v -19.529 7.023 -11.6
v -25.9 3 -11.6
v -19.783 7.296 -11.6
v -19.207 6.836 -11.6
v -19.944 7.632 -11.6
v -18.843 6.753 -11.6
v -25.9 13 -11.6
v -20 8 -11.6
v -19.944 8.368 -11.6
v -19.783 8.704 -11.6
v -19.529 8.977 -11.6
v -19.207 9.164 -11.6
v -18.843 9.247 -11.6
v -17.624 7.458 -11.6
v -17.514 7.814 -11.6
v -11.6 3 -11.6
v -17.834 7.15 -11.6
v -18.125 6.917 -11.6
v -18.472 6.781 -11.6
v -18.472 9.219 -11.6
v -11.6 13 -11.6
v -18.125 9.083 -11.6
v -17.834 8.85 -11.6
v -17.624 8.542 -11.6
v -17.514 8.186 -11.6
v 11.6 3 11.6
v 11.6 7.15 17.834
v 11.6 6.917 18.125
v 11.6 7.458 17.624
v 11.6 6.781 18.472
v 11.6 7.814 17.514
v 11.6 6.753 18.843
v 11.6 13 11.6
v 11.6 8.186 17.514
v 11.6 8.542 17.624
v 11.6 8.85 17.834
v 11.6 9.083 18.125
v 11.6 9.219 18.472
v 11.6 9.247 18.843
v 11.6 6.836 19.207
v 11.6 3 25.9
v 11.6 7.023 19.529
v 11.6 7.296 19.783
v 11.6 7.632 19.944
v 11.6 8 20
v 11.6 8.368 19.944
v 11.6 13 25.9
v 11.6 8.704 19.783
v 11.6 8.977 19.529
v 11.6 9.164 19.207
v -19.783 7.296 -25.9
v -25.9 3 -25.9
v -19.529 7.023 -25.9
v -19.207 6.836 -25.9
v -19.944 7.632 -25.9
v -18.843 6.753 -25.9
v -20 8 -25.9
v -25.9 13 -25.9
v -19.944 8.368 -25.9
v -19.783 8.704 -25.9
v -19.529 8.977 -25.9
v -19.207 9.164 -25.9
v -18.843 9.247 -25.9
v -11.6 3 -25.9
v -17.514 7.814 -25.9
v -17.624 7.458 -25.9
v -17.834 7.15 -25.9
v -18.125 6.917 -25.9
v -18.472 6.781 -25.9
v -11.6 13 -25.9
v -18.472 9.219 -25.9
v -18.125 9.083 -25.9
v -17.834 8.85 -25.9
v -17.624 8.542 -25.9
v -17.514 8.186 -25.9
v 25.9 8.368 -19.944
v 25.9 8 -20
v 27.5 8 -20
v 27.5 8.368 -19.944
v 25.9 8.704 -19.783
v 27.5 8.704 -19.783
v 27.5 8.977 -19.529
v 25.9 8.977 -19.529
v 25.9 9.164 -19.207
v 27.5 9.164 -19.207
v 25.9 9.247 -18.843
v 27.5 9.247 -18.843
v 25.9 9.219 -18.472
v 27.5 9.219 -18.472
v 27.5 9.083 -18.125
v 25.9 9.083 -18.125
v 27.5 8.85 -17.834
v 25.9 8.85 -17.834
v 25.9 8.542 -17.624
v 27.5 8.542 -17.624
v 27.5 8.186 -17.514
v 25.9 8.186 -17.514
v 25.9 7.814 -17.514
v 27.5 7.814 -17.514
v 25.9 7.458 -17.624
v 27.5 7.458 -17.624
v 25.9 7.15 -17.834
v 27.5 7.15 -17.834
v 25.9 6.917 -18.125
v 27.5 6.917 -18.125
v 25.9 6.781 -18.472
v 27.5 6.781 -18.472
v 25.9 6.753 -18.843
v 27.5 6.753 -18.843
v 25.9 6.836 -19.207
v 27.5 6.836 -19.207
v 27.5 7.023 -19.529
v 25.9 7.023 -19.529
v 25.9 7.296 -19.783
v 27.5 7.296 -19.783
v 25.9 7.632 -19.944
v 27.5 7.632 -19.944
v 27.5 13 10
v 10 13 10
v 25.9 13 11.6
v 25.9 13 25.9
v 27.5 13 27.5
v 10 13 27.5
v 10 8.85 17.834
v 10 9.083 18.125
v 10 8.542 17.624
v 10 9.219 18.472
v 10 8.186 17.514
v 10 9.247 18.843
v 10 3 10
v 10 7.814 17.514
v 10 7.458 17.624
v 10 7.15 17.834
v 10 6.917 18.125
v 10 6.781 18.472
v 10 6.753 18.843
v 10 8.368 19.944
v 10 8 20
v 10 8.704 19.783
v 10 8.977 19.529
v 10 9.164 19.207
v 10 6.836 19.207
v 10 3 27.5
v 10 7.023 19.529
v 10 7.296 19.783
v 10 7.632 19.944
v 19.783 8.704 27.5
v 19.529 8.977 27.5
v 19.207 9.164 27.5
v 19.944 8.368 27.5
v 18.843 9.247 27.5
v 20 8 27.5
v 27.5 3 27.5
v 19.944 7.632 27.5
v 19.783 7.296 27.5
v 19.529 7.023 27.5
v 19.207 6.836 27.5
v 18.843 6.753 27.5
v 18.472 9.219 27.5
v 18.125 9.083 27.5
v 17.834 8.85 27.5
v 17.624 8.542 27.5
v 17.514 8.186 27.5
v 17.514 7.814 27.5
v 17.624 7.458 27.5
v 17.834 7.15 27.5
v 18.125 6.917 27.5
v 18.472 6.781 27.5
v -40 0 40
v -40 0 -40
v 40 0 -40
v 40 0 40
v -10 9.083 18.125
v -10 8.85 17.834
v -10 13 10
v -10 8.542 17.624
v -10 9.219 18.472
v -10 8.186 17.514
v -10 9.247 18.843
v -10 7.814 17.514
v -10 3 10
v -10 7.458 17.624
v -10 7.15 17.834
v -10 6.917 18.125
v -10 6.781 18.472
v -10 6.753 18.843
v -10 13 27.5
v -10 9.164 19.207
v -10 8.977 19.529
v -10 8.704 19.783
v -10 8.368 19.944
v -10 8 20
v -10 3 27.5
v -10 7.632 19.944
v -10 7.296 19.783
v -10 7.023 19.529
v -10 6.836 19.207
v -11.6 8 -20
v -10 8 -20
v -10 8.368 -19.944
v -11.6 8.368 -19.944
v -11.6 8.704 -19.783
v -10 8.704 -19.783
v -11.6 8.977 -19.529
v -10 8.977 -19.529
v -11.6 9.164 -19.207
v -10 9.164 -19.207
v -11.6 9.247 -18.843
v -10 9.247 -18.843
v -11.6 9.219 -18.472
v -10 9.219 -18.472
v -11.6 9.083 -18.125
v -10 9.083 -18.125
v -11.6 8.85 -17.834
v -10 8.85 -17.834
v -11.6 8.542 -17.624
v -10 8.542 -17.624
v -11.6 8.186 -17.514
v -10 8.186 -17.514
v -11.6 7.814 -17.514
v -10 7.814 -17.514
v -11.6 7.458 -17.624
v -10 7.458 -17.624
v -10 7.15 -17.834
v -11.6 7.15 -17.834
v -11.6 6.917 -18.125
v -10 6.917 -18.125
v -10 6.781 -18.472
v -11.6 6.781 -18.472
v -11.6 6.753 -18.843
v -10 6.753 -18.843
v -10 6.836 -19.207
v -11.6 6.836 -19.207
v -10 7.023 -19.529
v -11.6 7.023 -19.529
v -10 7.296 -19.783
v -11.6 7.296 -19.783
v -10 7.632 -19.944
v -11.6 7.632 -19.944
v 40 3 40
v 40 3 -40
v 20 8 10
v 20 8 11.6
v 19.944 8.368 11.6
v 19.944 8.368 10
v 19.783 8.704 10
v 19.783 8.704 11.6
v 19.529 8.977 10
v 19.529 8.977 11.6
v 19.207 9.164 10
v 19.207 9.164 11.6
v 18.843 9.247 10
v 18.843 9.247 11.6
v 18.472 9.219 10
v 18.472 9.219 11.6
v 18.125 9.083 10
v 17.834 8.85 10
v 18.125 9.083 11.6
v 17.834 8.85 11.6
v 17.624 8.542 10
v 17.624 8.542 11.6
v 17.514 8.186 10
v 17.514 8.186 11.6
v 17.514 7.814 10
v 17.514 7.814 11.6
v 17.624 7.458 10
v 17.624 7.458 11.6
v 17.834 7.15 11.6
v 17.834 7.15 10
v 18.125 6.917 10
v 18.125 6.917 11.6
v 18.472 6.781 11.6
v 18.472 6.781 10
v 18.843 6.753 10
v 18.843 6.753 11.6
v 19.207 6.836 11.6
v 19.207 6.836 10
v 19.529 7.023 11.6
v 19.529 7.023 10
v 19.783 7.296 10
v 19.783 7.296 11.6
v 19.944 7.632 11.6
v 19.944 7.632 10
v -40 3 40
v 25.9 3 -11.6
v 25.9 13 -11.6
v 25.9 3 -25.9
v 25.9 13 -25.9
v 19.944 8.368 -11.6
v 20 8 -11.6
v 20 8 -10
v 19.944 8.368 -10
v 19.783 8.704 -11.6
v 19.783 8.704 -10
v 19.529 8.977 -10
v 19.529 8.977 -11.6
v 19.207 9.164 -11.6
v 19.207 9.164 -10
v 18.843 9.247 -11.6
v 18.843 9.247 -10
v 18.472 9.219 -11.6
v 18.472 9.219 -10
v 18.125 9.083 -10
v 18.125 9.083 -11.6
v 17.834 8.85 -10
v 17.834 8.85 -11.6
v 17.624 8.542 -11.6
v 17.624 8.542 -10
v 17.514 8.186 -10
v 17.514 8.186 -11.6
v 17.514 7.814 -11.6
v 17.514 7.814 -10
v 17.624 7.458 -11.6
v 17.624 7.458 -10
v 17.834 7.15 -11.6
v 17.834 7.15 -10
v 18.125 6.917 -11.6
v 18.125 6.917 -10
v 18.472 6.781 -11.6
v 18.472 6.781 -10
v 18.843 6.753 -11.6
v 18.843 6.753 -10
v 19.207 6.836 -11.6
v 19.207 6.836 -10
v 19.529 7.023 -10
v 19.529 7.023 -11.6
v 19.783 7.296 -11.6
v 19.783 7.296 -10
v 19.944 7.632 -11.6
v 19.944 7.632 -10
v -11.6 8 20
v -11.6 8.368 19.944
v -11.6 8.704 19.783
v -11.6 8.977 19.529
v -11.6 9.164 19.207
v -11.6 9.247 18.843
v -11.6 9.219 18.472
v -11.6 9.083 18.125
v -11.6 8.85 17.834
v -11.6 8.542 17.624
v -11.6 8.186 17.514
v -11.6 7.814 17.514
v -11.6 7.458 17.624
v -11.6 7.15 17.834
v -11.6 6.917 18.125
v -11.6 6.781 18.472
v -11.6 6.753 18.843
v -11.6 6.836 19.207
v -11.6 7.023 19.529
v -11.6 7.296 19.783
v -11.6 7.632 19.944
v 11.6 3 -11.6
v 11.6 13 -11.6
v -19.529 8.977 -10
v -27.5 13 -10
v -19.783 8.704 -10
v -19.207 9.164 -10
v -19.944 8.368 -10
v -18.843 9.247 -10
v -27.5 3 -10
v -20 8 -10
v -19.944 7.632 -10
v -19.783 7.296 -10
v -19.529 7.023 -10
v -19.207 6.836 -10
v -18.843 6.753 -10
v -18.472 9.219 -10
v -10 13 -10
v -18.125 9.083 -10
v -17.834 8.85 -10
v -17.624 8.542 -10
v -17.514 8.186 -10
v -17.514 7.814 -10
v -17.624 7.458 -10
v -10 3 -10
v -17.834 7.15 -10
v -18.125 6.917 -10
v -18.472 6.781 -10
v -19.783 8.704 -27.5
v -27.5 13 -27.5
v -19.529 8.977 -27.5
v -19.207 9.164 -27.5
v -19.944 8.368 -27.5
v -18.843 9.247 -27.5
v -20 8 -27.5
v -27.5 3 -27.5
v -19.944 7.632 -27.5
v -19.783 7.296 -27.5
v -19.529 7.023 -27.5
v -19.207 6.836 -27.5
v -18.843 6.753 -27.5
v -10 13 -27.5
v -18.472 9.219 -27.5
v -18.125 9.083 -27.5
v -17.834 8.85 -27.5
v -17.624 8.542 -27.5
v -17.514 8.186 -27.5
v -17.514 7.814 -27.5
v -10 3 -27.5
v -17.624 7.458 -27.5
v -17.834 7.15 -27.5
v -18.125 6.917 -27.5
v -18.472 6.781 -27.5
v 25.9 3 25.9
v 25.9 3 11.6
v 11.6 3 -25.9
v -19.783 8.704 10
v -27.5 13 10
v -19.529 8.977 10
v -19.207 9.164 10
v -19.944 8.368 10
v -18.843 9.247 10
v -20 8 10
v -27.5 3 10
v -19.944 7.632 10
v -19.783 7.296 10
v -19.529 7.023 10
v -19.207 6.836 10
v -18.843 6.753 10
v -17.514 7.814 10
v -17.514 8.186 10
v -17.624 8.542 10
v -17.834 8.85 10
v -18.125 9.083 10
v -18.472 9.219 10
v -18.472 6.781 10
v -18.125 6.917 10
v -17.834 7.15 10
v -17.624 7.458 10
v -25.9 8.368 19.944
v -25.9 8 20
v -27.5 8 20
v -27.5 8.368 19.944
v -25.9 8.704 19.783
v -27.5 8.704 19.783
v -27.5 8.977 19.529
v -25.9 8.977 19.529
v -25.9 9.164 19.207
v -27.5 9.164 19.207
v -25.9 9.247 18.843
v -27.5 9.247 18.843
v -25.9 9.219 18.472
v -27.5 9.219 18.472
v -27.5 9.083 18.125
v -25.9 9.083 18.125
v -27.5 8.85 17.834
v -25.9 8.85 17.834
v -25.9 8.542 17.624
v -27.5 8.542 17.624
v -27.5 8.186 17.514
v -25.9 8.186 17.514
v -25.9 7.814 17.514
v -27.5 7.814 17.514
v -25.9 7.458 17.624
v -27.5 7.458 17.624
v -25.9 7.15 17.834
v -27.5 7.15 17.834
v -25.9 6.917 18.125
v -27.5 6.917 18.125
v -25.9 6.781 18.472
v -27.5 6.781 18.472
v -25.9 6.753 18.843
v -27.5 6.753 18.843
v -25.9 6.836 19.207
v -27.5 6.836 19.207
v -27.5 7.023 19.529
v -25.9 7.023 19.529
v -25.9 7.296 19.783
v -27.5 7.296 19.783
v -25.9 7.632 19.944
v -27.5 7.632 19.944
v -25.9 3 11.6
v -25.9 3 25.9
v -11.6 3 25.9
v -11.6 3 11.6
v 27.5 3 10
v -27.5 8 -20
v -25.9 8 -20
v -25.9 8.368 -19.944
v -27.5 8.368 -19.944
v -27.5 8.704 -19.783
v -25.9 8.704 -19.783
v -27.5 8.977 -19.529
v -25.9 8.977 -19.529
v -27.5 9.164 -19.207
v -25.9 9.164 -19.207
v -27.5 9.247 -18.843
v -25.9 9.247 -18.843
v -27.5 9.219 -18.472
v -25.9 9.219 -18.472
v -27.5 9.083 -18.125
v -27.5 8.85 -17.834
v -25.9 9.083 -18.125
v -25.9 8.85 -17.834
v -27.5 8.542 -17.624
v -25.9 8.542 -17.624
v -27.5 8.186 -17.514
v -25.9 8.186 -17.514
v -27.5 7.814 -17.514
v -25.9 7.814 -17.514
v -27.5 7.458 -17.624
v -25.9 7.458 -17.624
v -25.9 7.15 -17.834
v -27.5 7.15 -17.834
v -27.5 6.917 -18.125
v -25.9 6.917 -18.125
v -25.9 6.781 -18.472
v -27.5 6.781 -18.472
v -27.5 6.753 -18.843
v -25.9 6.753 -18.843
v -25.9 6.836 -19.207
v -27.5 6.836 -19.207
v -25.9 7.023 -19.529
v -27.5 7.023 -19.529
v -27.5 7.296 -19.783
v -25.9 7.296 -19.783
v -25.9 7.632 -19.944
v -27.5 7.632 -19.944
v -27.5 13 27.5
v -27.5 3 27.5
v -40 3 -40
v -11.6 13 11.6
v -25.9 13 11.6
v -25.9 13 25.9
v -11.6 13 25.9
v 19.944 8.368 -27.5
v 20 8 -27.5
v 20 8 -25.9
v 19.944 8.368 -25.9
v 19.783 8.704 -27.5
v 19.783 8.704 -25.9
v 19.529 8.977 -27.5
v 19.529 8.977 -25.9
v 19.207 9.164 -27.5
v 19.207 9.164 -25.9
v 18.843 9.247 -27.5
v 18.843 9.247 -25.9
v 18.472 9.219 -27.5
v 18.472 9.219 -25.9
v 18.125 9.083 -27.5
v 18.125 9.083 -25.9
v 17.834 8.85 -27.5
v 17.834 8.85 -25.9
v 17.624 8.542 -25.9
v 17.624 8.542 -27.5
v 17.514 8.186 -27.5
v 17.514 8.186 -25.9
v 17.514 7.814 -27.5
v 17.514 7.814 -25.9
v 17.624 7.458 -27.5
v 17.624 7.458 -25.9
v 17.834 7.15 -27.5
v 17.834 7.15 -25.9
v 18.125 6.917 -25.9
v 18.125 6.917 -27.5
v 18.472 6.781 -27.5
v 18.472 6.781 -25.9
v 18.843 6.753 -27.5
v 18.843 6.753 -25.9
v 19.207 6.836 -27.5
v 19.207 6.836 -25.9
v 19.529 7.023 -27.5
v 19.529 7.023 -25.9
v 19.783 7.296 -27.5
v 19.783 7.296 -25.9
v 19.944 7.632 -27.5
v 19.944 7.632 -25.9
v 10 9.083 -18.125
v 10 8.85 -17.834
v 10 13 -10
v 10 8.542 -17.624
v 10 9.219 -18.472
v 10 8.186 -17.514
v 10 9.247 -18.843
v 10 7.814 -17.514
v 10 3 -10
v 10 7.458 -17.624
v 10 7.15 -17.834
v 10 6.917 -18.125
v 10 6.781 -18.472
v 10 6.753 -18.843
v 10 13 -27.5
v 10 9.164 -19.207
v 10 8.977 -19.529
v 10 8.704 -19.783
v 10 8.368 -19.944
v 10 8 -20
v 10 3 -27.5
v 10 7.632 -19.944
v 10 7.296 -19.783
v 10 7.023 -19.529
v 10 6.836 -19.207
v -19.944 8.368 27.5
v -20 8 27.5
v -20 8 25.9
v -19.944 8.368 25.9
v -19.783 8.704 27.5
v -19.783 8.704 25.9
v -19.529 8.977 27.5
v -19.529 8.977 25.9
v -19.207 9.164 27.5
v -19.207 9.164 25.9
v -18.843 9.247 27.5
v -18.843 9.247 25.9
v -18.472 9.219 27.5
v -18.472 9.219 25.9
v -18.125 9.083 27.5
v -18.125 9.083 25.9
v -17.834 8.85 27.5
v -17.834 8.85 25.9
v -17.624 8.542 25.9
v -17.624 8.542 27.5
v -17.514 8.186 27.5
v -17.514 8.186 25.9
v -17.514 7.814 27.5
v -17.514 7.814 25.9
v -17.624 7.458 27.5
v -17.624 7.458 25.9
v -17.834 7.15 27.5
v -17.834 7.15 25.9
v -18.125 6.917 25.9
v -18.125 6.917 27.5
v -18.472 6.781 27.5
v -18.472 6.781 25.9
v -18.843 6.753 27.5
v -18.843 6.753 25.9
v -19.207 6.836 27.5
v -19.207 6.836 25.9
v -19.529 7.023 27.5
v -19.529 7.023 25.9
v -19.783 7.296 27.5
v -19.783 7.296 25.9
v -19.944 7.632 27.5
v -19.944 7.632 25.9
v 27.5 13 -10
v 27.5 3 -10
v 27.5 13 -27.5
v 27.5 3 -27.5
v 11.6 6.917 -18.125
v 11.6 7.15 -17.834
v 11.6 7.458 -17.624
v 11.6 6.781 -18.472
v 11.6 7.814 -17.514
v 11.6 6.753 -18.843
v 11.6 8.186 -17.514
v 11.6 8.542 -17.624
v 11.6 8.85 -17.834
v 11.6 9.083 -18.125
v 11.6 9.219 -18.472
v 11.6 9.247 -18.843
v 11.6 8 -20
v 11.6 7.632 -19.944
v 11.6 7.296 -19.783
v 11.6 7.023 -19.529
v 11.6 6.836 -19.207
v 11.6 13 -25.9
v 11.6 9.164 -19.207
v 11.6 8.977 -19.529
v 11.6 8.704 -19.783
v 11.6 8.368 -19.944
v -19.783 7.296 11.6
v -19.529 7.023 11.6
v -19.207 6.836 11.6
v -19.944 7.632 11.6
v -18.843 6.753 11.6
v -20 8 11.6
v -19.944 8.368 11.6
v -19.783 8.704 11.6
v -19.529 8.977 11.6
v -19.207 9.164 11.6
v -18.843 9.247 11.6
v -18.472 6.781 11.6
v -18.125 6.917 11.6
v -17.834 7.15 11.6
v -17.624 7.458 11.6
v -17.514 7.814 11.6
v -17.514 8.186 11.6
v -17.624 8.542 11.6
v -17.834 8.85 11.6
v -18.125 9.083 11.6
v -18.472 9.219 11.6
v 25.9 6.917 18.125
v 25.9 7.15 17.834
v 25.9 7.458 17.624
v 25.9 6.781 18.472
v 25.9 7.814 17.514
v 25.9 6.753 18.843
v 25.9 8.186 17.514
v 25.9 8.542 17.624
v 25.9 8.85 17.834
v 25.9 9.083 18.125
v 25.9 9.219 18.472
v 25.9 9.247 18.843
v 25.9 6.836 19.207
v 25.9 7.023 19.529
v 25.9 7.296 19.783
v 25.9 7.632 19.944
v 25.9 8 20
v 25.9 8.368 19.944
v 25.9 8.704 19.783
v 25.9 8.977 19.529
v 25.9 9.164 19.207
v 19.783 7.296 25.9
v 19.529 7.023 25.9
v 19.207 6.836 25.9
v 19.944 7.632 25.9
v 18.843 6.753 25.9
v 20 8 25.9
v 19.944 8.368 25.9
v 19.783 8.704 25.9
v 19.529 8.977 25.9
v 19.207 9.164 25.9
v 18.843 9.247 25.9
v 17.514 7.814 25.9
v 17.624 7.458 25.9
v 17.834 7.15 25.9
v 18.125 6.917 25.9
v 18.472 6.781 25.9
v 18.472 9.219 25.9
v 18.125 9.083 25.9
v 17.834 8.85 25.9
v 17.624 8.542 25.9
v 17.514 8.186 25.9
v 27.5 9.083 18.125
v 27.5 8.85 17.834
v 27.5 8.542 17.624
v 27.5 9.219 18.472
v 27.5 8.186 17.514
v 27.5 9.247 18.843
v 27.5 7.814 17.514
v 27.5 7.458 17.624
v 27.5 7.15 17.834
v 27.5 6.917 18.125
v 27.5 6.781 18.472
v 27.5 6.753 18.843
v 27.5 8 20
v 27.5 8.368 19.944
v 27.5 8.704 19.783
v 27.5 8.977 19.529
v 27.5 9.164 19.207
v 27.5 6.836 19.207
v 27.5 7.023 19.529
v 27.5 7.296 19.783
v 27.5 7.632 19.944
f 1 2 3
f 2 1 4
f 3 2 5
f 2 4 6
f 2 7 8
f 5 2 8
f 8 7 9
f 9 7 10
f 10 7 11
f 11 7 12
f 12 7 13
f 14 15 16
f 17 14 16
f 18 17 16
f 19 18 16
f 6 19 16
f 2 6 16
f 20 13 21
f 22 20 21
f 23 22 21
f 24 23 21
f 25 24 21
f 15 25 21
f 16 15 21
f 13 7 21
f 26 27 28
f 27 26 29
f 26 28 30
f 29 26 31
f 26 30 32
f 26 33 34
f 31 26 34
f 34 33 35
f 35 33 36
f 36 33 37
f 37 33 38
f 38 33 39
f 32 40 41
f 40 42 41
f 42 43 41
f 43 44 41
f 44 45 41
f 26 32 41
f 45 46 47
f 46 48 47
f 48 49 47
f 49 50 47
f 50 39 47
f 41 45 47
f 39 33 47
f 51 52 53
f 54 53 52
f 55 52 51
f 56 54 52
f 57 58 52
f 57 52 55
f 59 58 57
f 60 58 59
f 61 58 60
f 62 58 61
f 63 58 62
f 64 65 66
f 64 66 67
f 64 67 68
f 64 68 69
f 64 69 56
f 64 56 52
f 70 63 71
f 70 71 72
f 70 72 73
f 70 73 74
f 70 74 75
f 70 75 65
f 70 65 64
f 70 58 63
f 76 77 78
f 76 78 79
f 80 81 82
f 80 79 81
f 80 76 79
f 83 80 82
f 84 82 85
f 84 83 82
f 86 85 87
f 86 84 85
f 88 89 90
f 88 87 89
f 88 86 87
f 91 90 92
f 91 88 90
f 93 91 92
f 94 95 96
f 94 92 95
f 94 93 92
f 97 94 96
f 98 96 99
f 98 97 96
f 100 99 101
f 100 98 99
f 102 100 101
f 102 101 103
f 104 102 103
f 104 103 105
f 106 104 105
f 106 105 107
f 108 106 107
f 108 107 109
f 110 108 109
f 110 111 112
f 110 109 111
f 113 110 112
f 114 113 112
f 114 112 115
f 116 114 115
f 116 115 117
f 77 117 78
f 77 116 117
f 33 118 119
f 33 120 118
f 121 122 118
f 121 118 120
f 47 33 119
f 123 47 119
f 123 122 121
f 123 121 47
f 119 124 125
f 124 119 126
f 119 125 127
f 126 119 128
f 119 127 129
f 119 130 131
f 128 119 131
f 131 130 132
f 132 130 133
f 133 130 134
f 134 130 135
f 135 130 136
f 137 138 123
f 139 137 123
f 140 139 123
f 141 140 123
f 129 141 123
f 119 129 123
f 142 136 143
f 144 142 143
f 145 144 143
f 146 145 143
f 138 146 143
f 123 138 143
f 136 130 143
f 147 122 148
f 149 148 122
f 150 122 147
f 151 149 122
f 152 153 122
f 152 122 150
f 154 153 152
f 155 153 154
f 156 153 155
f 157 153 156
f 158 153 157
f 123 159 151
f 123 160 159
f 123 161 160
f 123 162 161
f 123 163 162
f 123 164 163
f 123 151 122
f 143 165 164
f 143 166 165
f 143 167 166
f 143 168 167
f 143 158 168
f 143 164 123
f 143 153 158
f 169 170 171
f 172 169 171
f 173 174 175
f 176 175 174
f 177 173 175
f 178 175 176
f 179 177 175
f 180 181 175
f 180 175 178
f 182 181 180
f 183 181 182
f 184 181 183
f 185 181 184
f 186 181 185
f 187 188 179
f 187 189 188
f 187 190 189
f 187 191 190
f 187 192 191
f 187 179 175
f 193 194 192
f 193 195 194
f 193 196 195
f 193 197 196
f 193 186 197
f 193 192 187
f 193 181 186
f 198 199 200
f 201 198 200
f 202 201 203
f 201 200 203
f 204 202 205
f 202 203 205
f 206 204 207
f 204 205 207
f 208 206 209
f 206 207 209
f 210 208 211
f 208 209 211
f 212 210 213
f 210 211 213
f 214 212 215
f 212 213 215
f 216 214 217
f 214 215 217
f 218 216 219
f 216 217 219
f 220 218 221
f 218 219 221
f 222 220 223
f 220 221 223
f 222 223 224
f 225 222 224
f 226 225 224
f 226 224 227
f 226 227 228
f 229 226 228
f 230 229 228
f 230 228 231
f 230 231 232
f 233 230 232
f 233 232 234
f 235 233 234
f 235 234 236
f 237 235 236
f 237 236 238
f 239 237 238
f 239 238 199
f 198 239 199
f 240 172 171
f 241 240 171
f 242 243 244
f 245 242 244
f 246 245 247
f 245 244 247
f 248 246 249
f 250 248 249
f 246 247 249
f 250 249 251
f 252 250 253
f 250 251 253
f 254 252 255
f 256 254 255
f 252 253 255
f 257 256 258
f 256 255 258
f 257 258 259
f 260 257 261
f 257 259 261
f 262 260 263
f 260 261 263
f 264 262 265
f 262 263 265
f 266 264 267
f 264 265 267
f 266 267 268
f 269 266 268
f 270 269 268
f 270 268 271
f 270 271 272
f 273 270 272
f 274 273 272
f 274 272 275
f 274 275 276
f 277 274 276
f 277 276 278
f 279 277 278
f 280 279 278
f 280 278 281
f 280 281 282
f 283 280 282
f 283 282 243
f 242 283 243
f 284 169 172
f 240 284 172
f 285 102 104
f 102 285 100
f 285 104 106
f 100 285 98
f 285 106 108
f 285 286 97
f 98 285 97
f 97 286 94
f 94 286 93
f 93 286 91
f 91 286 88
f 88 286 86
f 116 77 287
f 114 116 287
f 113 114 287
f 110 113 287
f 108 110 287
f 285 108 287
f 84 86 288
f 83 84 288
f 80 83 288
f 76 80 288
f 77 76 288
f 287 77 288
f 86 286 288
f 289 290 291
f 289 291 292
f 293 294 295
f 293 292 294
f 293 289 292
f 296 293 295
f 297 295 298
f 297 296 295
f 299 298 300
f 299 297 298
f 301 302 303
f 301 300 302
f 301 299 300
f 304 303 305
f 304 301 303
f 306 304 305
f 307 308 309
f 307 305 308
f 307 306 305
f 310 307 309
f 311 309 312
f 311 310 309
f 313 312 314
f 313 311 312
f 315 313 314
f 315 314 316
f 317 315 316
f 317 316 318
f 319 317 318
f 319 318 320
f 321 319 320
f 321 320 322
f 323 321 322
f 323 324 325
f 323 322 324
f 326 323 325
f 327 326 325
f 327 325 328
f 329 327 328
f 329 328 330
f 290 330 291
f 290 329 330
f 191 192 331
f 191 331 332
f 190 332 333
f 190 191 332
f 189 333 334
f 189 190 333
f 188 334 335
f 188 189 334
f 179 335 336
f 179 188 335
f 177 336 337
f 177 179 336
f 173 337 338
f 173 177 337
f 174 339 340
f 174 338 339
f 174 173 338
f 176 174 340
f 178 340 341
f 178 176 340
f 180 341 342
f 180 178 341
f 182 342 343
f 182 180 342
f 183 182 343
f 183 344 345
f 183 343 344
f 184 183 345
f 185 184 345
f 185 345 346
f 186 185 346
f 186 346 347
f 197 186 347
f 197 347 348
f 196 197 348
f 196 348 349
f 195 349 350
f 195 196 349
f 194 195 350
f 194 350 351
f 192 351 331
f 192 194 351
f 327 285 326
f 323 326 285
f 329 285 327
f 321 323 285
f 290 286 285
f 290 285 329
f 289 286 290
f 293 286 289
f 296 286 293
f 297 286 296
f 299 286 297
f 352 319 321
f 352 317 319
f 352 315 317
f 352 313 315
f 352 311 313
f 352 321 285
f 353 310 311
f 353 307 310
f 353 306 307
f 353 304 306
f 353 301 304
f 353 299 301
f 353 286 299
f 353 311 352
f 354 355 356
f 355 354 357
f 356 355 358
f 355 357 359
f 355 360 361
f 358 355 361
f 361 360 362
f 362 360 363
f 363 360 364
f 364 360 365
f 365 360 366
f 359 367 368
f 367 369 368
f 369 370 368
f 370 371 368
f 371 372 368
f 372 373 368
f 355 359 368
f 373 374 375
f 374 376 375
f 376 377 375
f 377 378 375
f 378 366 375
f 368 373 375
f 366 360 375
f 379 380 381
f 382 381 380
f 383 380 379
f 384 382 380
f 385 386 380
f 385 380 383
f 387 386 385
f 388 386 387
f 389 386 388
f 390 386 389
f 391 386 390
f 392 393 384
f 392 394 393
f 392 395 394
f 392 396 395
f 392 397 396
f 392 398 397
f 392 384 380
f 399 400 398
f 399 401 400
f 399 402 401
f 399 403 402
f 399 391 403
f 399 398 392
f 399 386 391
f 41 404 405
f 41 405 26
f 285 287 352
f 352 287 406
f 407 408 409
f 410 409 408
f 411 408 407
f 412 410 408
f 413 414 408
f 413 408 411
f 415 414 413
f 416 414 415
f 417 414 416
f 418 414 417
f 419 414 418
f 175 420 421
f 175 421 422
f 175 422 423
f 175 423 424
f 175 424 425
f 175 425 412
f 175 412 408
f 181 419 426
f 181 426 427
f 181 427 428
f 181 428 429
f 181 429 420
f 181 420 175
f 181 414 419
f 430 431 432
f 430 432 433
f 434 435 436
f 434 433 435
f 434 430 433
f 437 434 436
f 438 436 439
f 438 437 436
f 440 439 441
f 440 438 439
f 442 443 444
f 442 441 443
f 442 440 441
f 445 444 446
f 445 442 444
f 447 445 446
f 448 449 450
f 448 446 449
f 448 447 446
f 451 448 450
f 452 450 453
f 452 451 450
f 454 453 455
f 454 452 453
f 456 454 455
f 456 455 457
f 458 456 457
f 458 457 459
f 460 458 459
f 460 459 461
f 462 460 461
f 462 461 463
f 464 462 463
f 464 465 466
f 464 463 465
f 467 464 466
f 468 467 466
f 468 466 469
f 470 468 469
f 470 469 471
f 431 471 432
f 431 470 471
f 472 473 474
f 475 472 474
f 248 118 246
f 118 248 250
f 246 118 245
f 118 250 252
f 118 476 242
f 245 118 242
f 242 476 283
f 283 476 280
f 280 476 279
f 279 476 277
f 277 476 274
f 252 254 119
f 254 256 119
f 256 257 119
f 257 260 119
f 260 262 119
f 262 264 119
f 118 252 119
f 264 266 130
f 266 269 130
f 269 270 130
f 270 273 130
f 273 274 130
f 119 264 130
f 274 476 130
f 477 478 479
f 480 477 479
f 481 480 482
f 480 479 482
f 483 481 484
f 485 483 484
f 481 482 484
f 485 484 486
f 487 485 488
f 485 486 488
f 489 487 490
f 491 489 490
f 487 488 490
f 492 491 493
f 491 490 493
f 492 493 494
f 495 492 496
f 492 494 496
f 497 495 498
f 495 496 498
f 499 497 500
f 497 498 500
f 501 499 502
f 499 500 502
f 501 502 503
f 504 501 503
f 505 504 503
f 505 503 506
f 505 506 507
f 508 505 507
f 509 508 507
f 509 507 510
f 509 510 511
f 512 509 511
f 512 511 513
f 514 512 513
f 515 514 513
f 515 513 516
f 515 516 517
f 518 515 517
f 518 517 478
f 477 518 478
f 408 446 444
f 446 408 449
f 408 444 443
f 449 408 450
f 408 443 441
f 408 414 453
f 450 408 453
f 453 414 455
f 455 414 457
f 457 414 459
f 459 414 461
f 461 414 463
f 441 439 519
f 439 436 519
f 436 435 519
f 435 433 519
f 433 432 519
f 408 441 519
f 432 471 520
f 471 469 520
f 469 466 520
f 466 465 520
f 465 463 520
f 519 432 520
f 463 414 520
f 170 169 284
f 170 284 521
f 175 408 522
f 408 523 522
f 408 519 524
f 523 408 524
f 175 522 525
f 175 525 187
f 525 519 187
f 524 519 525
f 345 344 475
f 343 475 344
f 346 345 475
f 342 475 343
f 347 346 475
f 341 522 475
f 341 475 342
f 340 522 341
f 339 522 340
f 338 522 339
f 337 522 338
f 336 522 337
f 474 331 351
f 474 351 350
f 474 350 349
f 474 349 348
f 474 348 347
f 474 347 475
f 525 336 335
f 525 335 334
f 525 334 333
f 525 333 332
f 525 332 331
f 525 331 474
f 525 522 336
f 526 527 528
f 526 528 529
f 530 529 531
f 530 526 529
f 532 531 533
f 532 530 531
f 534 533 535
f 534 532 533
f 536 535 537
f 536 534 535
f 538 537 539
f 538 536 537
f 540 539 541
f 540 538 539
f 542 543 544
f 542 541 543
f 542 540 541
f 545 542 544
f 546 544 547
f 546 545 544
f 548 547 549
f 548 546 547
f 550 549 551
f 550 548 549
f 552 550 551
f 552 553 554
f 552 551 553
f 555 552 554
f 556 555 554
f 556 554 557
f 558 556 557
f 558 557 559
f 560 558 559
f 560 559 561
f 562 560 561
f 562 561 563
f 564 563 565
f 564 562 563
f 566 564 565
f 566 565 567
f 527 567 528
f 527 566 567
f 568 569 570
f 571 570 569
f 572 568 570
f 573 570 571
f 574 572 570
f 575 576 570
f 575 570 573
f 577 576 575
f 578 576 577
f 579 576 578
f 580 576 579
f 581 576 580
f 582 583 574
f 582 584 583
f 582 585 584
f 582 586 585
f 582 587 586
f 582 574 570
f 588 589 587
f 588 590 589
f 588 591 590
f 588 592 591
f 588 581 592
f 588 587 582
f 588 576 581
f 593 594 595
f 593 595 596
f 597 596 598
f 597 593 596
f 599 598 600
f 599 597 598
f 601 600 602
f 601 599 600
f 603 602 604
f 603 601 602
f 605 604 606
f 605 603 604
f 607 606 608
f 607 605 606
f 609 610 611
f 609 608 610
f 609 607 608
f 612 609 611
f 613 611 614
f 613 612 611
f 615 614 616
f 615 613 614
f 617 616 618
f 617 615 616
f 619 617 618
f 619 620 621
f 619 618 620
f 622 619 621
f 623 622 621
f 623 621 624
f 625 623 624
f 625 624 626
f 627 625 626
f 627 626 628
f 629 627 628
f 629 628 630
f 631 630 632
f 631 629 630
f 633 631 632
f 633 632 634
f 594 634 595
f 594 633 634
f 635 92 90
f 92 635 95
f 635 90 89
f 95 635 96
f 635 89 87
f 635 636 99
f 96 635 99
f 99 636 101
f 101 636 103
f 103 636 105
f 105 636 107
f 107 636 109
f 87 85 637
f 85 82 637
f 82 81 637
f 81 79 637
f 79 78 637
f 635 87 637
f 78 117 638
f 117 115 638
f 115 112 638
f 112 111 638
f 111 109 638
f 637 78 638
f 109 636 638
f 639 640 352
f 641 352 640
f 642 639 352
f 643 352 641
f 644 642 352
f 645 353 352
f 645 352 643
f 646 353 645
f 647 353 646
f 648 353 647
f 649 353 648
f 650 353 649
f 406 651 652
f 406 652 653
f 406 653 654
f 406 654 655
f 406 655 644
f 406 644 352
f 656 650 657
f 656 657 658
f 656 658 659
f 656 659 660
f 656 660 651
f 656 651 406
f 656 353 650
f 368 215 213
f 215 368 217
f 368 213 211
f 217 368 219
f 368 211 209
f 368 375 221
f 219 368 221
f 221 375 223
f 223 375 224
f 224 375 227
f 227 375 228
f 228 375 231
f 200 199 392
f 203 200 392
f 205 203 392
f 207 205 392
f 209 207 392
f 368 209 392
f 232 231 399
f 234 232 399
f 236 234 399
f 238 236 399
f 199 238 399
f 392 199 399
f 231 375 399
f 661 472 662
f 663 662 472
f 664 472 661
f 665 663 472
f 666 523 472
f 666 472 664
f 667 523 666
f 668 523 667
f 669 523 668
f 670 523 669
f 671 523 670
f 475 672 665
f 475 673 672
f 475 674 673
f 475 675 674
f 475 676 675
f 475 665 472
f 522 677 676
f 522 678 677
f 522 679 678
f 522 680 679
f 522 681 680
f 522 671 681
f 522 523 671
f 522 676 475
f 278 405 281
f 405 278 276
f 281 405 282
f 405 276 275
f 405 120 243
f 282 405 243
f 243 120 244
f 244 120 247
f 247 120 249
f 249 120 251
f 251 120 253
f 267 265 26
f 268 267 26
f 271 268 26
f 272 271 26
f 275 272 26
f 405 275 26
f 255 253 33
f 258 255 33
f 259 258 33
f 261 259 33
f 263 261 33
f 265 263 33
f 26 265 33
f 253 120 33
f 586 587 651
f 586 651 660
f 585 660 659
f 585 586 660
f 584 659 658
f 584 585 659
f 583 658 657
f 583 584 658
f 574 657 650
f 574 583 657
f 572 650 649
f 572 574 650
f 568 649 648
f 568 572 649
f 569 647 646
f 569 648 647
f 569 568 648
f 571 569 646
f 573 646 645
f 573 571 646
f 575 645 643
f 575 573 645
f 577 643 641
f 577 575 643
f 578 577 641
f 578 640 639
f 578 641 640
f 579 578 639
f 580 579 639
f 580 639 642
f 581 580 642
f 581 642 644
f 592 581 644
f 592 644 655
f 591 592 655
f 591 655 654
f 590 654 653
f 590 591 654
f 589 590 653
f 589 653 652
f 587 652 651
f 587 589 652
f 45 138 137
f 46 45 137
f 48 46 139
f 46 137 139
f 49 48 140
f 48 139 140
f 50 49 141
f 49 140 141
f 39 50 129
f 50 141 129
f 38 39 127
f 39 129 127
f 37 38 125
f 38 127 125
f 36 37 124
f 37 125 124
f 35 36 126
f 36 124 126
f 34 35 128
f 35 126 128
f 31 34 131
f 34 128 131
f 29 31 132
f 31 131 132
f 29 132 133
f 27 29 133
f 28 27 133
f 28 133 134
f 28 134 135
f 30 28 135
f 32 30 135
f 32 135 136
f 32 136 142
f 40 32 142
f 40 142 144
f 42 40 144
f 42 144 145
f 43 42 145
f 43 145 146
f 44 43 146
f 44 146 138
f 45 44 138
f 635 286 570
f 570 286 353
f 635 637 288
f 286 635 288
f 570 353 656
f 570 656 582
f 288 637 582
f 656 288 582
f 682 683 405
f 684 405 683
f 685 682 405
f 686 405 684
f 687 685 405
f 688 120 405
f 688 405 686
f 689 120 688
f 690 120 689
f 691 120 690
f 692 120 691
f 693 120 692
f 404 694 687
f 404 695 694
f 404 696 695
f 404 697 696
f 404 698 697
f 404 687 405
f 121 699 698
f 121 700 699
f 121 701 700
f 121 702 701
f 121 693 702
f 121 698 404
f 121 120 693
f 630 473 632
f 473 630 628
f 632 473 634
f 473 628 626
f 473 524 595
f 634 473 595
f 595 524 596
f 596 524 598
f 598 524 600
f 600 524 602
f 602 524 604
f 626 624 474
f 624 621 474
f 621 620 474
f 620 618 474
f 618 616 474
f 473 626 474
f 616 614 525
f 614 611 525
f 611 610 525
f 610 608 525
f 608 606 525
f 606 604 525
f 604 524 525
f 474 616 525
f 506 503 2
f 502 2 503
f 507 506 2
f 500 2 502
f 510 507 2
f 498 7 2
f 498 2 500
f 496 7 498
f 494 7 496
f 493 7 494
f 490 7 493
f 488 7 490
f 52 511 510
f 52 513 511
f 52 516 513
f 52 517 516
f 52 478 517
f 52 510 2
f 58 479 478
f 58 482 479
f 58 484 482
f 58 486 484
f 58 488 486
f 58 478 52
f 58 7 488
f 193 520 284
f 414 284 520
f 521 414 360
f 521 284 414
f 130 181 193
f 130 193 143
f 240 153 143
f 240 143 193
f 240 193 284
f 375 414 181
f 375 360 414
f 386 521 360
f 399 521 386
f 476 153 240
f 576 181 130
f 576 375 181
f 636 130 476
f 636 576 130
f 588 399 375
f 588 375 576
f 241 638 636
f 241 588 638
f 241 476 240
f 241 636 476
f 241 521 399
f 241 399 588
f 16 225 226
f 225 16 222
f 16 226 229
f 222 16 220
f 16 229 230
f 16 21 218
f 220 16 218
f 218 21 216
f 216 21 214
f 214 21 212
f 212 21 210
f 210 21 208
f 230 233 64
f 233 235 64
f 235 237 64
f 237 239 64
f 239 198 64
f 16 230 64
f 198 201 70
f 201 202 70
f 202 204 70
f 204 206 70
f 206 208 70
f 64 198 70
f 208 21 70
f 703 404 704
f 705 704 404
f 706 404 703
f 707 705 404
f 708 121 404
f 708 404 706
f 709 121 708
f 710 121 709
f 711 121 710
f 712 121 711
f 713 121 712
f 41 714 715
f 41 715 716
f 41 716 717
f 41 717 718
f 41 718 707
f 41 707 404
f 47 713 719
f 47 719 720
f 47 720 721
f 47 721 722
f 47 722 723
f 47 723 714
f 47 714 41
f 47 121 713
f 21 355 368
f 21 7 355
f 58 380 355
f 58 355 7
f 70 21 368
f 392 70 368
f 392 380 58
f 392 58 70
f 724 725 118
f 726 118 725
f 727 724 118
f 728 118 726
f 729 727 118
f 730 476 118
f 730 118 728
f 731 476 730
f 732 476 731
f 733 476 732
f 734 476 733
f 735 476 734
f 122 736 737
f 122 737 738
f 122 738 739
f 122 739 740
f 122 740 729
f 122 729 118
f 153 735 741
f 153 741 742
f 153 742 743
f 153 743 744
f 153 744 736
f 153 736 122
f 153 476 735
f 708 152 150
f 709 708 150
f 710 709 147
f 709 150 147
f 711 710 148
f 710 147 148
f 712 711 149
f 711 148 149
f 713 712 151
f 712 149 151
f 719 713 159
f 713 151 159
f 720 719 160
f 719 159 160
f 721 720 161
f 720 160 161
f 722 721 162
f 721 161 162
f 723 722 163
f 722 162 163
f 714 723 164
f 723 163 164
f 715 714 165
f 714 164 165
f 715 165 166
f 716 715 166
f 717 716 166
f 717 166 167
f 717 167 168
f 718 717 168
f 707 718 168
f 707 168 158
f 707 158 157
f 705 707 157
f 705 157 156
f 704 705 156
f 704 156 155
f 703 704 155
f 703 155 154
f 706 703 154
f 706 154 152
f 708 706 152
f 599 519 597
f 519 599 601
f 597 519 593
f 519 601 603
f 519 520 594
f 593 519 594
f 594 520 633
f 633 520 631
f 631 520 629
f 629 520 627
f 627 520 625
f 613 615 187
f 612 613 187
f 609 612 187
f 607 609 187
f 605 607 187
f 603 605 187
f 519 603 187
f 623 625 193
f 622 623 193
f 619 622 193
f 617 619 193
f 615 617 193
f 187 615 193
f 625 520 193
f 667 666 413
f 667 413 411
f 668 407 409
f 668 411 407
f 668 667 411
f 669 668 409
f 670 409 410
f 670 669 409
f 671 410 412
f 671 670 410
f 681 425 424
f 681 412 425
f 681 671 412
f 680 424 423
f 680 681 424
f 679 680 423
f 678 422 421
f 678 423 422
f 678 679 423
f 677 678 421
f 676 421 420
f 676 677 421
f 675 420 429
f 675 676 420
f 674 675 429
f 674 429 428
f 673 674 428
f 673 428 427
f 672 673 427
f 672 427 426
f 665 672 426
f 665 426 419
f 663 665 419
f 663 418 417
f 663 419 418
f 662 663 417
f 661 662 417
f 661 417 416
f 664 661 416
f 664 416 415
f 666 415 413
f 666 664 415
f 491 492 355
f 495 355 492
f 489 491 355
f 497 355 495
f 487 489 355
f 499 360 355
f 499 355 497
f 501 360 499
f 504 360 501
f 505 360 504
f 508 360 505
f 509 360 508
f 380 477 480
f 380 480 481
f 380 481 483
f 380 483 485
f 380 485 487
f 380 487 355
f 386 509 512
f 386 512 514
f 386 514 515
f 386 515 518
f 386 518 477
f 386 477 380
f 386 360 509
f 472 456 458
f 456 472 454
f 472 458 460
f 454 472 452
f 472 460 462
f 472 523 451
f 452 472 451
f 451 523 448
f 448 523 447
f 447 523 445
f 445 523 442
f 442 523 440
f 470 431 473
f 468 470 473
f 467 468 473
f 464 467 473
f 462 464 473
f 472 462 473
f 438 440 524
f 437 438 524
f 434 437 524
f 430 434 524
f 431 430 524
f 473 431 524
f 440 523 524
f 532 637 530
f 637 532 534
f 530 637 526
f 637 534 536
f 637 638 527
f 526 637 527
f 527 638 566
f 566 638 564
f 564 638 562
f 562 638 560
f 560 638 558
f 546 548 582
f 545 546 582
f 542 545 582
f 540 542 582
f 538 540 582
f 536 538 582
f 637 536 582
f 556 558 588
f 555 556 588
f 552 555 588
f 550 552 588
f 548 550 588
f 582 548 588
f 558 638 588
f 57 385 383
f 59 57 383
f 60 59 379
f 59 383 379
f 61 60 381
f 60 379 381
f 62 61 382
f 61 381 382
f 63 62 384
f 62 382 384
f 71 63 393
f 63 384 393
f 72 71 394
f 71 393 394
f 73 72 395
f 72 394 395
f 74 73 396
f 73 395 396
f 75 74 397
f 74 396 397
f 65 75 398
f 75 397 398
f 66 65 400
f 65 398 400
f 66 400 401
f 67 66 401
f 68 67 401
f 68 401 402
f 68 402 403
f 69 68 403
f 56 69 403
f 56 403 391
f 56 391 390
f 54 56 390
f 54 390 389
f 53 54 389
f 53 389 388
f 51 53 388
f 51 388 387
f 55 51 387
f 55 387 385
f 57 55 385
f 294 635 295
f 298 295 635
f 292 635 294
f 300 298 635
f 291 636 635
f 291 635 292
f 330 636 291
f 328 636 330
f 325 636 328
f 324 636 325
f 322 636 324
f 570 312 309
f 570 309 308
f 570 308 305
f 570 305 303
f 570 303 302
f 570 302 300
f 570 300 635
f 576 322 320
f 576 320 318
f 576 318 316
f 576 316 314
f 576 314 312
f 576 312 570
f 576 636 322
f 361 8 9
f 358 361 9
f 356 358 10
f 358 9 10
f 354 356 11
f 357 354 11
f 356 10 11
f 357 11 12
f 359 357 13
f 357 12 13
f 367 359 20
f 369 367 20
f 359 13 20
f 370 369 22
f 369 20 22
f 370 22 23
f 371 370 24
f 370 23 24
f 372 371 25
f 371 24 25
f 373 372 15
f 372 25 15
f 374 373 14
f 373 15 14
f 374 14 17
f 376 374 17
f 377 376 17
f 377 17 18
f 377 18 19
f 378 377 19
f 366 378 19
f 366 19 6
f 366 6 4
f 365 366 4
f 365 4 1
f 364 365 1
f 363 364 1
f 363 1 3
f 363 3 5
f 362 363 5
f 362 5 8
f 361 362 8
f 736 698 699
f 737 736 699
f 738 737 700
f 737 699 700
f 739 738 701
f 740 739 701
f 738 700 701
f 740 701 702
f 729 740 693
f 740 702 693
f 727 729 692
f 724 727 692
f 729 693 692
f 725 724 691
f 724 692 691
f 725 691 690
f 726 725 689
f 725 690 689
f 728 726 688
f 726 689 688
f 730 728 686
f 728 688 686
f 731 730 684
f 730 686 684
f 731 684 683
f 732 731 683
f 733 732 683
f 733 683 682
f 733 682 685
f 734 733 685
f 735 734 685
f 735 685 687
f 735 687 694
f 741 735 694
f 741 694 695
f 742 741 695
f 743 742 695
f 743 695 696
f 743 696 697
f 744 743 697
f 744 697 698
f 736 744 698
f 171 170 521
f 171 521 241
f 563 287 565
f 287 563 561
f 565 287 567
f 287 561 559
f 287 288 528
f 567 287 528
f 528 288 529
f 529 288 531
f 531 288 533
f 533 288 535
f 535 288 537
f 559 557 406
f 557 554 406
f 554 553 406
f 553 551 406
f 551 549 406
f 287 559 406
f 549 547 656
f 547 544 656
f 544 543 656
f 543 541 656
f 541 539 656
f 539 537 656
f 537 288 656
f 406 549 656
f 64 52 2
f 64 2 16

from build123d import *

# Parameters (mm, degrees)
SKETCH1_W                   = 80
SKETCH1_H                   = 80
BOSS_EXTRUDE1_DEPTH         = 3
SKETCH2_W                   = 17.5
SKETCH2_H                   = 17.5
BOSS_EXTRUDE2_DEPTH         = 10
SKETCH3_W                   = 14.3
SKETCH3_H                   = 14.3
CUT_EXTRUDE1_DEPTH          = 10
TAP_DRILL_FOR_M3X0_5_TAP1_D = 2.5
TAP_DRILL_FOR_M3X0_5_TAP2_D = 2.5
MIRROR2_COPY_1_SKETCH_W     = 17.5
MIRROR2_COPY_1_SKETCH_H     = 17.5
MIRROR2_COPY_1_DEPTH        = 10
MIRROR2_COPY_2_SKETCH_W     = 14.3
MIRROR2_COPY_2_SKETCH_H     = 14.3
MIRROR2_COPY_2_DEPTH        = 10
MIRROR2_COPY_3_D            = 2.5
MIRROR2_COPY_4_D            = 2.5


with BuildPart() as part:
    # Sketch1 → Boss-Extrude1 (new body)
    with BuildSketch(Plane(origin=(0, 0, 0), x_dir=(1, 0, 0), z_dir=(0, 1, 0))):
        Rectangle(SKETCH1_W, SKETCH1_H)
    extrude(amount=BOSS_EXTRUDE1_DEPTH)

    # Sketch2 → Boss-Extrude2 (add)
    with BuildSketch(Plane(origin=(0, 3, 0), x_dir=(1, 0, 0), z_dir=(0, 1, 0))):
        with Locations((-18.75, 18.75)):
            Rectangle(SKETCH2_W, SKETCH2_H)
    boss_extrude2 = extrude(amount=BOSS_EXTRUDE2_DEPTH)

    # Sketch3 → Cut-Extrude1 (cut)
    with BuildSketch(Plane(origin=(0, 13, 0), x_dir=(1, 0, 0), z_dir=(0, 1, 0))):
        with Locations((-18.75, 18.75)):
            Rectangle(SKETCH3_W, SKETCH3_H)
    cut_extrude1 = extrude(amount=-CUT_EXTRUDE1_DEPTH, mode=Mode.SUBTRACT)

    # Tap Drill for M3x0.5 Tap1 (through all)
    with Locations(Plane.XY.offset(-10)):
        with Locations((-18.75, 8)):
            tap_drill_for_m3x0_5_tap1 = Hole(TAP_DRILL_FOR_M3X0_5_TAP1_D / 2)

    # Tap Drill for M3x0.5 Tap2 (through all)
    with Locations(Plane.ZY.offset(27.5)):
        with Locations((-18.75, 8)):
            tap_drill_for_m3x0_5_tap2 = Hole(TAP_DRILL_FOR_M3X0_5_TAP2_D / 2)

    # Mirror1: Boss-Extrude2, Cut-Extrude1, Tap Drill for M3x0.5 Tap1, Tap Drill for M3x0.5 Tap2 across plane
    add(boss_extrude2.mirror(Plane.ZY))
    add(cut_extrude1.mirror(Plane.ZY), mode=Mode.SUBTRACT)
    add(tap_drill_for_m3x0_5_tap1.mirror(Plane.ZY), mode=Mode.SUBTRACT)
    add(tap_drill_for_m3x0_5_tap2.mirror(Plane.ZY), mode=Mode.SUBTRACT)

    # Mirror2: Boss-Extrude2, Cut-Extrude1, Tap Drill for M3x0.5 Tap1, Tap Drill for M3x0.5 Tap2 across plane
    add(boss_extrude2.mirror(Plane.XY))
    add(cut_extrude1.mirror(Plane.XY), mode=Mode.SUBTRACT)
    add(tap_drill_for_m3x0_5_tap1.mirror(Plane.XY), mode=Mode.SUBTRACT)
    add(tap_drill_for_m3x0_5_tap2.mirror(Plane.XY), mode=Mode.SUBTRACT)

    # Mirror2 copy 1 sketch → Mirror2 copy 1 (add)
    with BuildSketch(Plane(origin=(0, 3, 0), x_dir=(-1, 0, 0), z_dir=(0, 1, 0))):
        with Locations((-18.75, 18.75)):
            Rectangle(MIRROR2_COPY_1_SKETCH_W, MIRROR2_COPY_1_SKETCH_H)
    extrude(amount=MIRROR2_COPY_1_DEPTH)

    # Mirror2 copy 2 sketch → Mirror2 copy 2 (cut)
    with BuildSketch(Plane(origin=(0, 13, 0), x_dir=(-1, 0, 0), z_dir=(0, 1, 0))):
        with Locations((-18.75, 18.75)):
            Rectangle(MIRROR2_COPY_2_SKETCH_W, MIRROR2_COPY_2_SKETCH_H)
    extrude(amount=-MIRROR2_COPY_2_DEPTH, mode=Mode.SUBTRACT)

    # Mirror2 copy 3 (through all)
    with Locations(Plane(origin=(0, 0, 10), x_dir=(-1, 0, 0), z_dir=(0, 0, -1))):
        with Locations((-18.75, 8)):
            Hole(MIRROR2_COPY_3_D / 2)

    # Mirror2 copy 4 (through all)
    with Locations(Plane(origin=(27.5, 0, 0), x_dir=(0, 0, -1), z_dir=(1, 0, 0))):
        with Locations((-18.75, 8)):
            Hole(MIRROR2_COPY_4_D / 2)


solid = part.part
